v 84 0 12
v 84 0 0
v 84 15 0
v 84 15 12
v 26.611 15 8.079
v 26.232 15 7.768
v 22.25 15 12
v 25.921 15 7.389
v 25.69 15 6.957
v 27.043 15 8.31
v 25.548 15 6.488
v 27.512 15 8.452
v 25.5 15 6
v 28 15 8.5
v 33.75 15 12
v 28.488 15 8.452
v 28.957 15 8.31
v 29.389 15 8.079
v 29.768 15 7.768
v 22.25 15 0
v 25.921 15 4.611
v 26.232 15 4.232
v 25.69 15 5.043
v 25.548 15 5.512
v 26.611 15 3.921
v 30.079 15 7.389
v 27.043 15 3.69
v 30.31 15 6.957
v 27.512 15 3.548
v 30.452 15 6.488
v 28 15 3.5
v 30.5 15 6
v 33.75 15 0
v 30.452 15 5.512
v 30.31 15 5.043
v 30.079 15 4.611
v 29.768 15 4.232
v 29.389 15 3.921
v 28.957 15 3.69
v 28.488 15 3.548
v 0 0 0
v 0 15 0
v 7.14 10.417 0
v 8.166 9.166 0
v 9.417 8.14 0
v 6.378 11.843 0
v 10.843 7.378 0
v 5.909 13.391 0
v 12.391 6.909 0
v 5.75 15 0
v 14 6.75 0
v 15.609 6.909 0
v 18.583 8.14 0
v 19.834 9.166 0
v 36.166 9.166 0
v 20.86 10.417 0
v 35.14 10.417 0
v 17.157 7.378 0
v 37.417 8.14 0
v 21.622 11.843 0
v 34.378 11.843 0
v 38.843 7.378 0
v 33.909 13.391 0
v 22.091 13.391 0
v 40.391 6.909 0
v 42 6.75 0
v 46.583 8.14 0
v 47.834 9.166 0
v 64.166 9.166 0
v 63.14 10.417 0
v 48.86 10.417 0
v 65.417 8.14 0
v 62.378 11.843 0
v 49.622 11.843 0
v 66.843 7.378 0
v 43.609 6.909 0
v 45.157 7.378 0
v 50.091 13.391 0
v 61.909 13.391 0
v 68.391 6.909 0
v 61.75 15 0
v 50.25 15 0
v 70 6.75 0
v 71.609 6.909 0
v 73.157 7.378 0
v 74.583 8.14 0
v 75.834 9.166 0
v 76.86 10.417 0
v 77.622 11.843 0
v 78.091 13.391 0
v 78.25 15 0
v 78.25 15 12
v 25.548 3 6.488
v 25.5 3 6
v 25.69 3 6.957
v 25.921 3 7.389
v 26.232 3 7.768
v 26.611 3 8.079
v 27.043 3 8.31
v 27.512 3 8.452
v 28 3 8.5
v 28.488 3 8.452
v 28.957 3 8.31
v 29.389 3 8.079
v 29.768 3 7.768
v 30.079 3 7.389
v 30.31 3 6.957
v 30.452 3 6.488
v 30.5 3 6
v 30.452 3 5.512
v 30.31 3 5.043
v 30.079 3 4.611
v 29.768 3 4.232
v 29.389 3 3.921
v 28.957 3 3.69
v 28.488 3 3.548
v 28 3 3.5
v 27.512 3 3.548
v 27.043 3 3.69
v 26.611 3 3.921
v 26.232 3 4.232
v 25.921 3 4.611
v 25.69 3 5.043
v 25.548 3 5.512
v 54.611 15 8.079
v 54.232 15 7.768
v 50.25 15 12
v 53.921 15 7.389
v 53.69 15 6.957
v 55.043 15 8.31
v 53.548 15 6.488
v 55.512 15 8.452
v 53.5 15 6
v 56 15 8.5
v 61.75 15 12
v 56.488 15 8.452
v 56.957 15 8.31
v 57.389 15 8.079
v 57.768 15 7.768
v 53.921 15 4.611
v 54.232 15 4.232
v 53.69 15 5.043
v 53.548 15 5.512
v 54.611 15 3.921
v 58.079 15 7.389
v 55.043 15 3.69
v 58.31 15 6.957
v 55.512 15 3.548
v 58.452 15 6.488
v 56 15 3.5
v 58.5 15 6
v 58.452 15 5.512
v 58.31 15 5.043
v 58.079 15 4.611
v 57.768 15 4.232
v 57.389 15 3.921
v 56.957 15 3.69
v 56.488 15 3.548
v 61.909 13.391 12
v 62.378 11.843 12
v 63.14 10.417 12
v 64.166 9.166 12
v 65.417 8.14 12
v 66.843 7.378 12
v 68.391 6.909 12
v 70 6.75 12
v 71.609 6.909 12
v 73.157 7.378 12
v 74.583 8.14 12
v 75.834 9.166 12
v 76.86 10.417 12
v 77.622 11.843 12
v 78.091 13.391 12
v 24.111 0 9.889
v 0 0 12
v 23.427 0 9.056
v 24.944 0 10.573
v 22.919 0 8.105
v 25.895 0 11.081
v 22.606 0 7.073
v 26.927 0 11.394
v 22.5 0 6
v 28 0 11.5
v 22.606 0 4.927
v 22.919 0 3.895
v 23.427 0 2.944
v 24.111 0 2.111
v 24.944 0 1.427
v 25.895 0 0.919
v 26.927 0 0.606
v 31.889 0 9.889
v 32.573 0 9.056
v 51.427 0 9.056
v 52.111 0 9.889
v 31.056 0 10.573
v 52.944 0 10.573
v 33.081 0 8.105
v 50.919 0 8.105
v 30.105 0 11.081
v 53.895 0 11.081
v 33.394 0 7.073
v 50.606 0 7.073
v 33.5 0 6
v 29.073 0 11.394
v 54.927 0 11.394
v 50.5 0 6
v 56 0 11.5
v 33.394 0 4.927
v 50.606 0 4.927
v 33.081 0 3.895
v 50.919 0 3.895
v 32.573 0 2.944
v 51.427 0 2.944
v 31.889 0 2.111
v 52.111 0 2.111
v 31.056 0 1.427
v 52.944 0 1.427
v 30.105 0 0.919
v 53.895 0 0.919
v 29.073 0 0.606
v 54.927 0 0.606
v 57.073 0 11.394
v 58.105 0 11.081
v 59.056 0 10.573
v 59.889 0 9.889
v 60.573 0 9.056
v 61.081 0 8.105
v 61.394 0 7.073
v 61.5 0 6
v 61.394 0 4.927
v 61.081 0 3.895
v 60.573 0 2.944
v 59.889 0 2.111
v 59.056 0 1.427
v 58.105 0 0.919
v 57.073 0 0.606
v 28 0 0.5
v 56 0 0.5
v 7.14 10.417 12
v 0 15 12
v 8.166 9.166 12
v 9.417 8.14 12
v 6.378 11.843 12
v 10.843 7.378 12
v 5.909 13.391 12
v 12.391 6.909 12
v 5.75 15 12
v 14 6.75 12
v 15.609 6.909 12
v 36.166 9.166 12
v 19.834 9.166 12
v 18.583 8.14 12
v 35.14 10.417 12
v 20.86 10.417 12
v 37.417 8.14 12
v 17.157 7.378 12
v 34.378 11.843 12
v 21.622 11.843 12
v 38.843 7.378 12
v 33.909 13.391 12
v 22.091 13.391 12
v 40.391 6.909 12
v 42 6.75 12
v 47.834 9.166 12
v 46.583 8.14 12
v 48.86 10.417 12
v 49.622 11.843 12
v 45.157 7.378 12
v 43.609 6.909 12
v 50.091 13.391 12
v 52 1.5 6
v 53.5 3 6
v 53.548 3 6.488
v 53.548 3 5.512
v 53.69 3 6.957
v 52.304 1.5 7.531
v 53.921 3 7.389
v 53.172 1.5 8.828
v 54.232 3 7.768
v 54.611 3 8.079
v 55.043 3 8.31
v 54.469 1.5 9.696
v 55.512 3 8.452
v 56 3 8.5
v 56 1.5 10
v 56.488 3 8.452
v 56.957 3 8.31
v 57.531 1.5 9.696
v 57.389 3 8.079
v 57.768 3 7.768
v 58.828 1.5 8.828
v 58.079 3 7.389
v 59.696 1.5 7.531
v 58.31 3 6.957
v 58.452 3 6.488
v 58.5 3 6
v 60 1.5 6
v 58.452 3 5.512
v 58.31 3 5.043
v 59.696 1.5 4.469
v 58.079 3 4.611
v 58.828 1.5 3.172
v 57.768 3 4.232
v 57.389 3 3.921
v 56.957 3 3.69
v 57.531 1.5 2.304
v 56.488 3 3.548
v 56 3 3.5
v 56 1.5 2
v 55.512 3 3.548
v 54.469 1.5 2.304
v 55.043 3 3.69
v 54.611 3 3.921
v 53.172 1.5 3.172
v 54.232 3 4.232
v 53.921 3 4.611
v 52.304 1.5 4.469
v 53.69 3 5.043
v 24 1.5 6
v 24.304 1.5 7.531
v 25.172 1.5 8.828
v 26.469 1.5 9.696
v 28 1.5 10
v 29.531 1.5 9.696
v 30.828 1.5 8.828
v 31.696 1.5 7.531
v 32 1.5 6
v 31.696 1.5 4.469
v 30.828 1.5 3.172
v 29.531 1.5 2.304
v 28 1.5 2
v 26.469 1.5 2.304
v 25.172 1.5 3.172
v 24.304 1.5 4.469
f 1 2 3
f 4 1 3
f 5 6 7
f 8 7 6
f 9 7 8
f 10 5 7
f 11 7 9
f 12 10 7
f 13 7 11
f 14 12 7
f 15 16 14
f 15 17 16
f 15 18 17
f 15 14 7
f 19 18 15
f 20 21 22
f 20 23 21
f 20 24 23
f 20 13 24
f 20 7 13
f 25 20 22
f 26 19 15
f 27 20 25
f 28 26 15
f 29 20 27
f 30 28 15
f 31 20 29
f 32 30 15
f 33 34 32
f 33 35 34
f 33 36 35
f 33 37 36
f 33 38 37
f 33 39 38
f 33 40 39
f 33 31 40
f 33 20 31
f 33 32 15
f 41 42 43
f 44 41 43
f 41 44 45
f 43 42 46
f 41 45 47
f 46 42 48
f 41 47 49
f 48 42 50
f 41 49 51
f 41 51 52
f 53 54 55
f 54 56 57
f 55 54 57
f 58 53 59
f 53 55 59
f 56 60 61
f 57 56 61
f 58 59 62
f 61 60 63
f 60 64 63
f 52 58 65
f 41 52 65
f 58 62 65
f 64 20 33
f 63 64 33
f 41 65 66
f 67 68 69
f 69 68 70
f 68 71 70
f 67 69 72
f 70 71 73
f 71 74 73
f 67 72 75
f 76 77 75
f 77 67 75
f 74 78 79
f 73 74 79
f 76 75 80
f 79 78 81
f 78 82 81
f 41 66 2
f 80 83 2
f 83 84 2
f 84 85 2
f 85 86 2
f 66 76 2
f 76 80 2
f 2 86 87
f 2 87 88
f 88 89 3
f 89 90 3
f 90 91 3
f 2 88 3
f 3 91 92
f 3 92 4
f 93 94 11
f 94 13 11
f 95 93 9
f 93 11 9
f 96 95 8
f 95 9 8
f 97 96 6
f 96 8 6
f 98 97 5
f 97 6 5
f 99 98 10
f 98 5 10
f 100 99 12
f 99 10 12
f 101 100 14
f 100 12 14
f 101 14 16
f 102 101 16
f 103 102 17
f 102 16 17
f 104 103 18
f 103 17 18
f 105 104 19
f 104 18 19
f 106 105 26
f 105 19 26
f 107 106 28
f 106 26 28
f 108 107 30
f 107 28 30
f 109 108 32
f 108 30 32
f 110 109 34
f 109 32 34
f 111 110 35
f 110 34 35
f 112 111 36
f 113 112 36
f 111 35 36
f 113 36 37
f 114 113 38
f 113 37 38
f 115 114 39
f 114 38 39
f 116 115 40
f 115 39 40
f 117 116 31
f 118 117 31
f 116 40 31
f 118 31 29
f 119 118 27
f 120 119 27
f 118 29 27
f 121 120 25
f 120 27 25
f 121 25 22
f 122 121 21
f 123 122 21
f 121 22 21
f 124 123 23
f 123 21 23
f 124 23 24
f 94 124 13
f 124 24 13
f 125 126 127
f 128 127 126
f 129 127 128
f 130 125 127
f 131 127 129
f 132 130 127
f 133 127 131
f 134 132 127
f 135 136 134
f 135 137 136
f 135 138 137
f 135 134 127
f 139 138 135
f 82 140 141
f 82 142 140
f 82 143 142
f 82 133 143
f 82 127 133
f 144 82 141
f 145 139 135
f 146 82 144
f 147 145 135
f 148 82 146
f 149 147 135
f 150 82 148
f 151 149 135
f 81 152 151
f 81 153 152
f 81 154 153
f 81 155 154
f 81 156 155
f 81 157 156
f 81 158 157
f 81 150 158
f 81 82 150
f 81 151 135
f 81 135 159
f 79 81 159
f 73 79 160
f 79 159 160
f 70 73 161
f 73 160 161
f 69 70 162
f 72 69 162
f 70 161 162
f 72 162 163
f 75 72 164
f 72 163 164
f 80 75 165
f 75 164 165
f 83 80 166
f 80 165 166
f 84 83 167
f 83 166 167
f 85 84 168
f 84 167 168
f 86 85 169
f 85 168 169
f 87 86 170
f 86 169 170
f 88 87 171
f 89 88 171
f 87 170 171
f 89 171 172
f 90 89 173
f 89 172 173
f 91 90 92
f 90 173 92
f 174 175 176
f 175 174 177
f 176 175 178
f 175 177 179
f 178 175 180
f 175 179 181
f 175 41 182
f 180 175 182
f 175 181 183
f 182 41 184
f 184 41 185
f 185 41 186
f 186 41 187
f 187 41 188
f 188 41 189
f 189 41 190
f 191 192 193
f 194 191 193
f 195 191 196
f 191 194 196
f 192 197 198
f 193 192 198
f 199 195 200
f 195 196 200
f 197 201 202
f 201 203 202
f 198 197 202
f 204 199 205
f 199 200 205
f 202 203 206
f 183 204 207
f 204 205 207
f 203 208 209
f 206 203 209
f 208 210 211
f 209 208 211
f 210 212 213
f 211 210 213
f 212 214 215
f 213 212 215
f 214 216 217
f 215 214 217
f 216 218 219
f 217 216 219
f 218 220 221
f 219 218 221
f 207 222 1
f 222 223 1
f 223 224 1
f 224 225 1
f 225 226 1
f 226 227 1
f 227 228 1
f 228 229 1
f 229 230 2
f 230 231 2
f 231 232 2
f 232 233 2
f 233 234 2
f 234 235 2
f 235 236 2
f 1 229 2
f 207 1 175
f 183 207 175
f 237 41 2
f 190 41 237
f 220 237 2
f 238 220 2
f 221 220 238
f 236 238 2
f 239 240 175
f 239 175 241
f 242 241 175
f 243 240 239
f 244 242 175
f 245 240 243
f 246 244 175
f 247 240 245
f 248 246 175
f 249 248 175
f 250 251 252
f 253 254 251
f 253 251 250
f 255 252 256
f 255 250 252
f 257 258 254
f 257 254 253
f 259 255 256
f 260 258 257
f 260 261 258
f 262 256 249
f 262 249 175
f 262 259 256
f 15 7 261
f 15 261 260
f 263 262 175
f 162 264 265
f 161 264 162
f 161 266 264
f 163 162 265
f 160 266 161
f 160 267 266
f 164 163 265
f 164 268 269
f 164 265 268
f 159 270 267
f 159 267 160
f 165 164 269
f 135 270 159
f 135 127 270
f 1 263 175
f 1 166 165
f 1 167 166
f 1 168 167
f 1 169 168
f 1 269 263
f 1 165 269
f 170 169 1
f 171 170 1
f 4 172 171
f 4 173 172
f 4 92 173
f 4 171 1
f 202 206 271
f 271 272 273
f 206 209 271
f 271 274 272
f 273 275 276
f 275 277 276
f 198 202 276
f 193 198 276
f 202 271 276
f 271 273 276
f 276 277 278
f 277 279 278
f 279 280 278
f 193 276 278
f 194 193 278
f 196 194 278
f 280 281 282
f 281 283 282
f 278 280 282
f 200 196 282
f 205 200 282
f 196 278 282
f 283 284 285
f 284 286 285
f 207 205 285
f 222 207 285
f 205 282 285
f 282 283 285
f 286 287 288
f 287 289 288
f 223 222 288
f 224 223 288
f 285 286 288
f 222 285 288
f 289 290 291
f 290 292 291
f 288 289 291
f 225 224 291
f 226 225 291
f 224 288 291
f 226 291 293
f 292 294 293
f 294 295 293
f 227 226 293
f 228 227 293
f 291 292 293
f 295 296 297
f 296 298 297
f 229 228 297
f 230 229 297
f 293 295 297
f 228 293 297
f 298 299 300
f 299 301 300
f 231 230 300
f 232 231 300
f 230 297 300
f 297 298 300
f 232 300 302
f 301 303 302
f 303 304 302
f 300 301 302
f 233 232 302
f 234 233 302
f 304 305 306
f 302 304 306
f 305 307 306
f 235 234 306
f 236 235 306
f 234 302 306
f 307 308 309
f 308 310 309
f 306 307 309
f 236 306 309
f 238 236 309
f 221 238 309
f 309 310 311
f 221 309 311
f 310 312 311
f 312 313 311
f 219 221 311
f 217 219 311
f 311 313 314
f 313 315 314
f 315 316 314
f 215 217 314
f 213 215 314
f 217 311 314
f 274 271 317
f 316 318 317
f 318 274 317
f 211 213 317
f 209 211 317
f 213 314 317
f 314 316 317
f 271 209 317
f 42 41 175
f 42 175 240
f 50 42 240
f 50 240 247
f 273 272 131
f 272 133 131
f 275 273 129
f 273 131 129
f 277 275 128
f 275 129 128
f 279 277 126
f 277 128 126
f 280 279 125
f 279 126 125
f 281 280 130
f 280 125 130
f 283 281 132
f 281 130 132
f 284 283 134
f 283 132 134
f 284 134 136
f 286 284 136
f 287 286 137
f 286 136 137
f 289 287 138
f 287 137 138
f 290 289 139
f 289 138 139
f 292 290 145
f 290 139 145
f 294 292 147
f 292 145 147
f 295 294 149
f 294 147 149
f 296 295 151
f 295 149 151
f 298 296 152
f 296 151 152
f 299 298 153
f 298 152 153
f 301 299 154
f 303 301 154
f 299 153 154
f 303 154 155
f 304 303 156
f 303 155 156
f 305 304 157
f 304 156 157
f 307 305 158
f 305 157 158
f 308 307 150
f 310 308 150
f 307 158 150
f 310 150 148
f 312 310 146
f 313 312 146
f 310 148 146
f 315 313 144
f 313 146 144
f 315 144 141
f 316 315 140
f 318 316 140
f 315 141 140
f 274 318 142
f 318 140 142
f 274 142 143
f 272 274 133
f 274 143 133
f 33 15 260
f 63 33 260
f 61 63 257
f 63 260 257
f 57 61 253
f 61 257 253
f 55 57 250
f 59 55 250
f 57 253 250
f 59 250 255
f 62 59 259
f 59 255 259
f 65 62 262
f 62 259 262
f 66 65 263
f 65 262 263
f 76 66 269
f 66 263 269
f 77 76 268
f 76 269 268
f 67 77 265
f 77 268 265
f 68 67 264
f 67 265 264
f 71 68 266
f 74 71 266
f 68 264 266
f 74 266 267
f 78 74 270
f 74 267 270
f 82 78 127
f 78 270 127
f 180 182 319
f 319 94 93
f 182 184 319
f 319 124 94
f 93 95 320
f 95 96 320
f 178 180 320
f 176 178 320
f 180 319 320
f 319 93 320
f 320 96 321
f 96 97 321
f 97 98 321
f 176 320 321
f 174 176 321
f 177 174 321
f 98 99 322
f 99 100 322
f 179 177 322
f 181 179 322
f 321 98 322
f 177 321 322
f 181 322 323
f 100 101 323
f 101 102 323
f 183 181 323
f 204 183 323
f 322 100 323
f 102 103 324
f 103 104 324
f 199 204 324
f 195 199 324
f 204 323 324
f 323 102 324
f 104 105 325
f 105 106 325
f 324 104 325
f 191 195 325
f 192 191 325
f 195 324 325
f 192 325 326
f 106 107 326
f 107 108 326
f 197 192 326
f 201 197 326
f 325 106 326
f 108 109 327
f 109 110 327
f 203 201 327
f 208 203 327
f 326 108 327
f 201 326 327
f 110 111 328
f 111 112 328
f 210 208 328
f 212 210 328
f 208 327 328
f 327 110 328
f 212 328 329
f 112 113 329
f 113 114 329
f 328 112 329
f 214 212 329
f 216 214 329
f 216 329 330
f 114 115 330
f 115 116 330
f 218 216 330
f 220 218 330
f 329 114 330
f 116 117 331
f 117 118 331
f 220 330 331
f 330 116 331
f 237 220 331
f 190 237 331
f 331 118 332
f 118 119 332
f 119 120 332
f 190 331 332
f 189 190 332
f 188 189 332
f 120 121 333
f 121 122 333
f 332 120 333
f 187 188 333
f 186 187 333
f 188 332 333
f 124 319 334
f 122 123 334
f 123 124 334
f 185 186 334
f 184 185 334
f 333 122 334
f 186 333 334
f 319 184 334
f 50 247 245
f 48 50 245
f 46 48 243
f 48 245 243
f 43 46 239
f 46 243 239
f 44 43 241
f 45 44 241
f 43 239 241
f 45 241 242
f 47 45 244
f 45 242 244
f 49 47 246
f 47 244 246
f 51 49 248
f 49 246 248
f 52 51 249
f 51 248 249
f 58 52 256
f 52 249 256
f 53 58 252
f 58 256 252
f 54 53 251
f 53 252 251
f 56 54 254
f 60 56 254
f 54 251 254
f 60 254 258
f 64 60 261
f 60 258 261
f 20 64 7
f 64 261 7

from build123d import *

# Parameters (mm, degrees)
SKETCH_W               = 84
SKETCH_H               = 15
PAD_DEPTH              = 12
SKETCH001_R            = 8.25
POCKET_DEPTH           = 12.001
LINEARPATTERN001_COUNT = 3
LINEARPATTERN001_PITCH = 28
HOLE_D                 = 5
HOLE_CSINK_D           = 11
HOLE_CSINK_ANGLE       = 90
LINEARPATTERN_COUNT    = 2
LINEARPATTERN_PITCH    = 28


with BuildPart() as part:
    # Sketch → Pad (new body)
    with BuildSketch(Plane.XY):
        with Locations((42, 7.5)):
            Rectangle(SKETCH_W, SKETCH_H)
    extrude(amount=PAD_DEPTH)

    # Sketch001 (on DatumPlane) → Pocket (cut, through all)
    with BuildSketch(Plane.XY.offset(12)):
        with Locations((14, 15)):
            Circle(SKETCH001_R)
    pocket = extrude(amount=-POCKET_DEPTH, mode=Mode.SUBTRACT)

    # LinearPattern001: Pocket ×3
    with Locations(*[(i * LINEARPATTERN001_PITCH, 0, 0) for i in range(1, LINEARPATTERN001_COUNT)]):
        add(pocket, mode=Mode.SUBTRACT)

    # Hole (through all)
    with Locations(Plane.XZ):
        with Locations((28, 6)):
            hole = CounterSinkHole(HOLE_D / 2, HOLE_CSINK_D / 2, counter_sink_angle=HOLE_CSINK_ANGLE)

    # LinearPattern: Hole ×2
    with Locations(*[(i * LINEARPATTERN_PITCH, 0, 0) for i in range(1, LINEARPATTERN_COUNT)]):
        add(hole, mode=Mode.SUBTRACT)


solid = part.part
